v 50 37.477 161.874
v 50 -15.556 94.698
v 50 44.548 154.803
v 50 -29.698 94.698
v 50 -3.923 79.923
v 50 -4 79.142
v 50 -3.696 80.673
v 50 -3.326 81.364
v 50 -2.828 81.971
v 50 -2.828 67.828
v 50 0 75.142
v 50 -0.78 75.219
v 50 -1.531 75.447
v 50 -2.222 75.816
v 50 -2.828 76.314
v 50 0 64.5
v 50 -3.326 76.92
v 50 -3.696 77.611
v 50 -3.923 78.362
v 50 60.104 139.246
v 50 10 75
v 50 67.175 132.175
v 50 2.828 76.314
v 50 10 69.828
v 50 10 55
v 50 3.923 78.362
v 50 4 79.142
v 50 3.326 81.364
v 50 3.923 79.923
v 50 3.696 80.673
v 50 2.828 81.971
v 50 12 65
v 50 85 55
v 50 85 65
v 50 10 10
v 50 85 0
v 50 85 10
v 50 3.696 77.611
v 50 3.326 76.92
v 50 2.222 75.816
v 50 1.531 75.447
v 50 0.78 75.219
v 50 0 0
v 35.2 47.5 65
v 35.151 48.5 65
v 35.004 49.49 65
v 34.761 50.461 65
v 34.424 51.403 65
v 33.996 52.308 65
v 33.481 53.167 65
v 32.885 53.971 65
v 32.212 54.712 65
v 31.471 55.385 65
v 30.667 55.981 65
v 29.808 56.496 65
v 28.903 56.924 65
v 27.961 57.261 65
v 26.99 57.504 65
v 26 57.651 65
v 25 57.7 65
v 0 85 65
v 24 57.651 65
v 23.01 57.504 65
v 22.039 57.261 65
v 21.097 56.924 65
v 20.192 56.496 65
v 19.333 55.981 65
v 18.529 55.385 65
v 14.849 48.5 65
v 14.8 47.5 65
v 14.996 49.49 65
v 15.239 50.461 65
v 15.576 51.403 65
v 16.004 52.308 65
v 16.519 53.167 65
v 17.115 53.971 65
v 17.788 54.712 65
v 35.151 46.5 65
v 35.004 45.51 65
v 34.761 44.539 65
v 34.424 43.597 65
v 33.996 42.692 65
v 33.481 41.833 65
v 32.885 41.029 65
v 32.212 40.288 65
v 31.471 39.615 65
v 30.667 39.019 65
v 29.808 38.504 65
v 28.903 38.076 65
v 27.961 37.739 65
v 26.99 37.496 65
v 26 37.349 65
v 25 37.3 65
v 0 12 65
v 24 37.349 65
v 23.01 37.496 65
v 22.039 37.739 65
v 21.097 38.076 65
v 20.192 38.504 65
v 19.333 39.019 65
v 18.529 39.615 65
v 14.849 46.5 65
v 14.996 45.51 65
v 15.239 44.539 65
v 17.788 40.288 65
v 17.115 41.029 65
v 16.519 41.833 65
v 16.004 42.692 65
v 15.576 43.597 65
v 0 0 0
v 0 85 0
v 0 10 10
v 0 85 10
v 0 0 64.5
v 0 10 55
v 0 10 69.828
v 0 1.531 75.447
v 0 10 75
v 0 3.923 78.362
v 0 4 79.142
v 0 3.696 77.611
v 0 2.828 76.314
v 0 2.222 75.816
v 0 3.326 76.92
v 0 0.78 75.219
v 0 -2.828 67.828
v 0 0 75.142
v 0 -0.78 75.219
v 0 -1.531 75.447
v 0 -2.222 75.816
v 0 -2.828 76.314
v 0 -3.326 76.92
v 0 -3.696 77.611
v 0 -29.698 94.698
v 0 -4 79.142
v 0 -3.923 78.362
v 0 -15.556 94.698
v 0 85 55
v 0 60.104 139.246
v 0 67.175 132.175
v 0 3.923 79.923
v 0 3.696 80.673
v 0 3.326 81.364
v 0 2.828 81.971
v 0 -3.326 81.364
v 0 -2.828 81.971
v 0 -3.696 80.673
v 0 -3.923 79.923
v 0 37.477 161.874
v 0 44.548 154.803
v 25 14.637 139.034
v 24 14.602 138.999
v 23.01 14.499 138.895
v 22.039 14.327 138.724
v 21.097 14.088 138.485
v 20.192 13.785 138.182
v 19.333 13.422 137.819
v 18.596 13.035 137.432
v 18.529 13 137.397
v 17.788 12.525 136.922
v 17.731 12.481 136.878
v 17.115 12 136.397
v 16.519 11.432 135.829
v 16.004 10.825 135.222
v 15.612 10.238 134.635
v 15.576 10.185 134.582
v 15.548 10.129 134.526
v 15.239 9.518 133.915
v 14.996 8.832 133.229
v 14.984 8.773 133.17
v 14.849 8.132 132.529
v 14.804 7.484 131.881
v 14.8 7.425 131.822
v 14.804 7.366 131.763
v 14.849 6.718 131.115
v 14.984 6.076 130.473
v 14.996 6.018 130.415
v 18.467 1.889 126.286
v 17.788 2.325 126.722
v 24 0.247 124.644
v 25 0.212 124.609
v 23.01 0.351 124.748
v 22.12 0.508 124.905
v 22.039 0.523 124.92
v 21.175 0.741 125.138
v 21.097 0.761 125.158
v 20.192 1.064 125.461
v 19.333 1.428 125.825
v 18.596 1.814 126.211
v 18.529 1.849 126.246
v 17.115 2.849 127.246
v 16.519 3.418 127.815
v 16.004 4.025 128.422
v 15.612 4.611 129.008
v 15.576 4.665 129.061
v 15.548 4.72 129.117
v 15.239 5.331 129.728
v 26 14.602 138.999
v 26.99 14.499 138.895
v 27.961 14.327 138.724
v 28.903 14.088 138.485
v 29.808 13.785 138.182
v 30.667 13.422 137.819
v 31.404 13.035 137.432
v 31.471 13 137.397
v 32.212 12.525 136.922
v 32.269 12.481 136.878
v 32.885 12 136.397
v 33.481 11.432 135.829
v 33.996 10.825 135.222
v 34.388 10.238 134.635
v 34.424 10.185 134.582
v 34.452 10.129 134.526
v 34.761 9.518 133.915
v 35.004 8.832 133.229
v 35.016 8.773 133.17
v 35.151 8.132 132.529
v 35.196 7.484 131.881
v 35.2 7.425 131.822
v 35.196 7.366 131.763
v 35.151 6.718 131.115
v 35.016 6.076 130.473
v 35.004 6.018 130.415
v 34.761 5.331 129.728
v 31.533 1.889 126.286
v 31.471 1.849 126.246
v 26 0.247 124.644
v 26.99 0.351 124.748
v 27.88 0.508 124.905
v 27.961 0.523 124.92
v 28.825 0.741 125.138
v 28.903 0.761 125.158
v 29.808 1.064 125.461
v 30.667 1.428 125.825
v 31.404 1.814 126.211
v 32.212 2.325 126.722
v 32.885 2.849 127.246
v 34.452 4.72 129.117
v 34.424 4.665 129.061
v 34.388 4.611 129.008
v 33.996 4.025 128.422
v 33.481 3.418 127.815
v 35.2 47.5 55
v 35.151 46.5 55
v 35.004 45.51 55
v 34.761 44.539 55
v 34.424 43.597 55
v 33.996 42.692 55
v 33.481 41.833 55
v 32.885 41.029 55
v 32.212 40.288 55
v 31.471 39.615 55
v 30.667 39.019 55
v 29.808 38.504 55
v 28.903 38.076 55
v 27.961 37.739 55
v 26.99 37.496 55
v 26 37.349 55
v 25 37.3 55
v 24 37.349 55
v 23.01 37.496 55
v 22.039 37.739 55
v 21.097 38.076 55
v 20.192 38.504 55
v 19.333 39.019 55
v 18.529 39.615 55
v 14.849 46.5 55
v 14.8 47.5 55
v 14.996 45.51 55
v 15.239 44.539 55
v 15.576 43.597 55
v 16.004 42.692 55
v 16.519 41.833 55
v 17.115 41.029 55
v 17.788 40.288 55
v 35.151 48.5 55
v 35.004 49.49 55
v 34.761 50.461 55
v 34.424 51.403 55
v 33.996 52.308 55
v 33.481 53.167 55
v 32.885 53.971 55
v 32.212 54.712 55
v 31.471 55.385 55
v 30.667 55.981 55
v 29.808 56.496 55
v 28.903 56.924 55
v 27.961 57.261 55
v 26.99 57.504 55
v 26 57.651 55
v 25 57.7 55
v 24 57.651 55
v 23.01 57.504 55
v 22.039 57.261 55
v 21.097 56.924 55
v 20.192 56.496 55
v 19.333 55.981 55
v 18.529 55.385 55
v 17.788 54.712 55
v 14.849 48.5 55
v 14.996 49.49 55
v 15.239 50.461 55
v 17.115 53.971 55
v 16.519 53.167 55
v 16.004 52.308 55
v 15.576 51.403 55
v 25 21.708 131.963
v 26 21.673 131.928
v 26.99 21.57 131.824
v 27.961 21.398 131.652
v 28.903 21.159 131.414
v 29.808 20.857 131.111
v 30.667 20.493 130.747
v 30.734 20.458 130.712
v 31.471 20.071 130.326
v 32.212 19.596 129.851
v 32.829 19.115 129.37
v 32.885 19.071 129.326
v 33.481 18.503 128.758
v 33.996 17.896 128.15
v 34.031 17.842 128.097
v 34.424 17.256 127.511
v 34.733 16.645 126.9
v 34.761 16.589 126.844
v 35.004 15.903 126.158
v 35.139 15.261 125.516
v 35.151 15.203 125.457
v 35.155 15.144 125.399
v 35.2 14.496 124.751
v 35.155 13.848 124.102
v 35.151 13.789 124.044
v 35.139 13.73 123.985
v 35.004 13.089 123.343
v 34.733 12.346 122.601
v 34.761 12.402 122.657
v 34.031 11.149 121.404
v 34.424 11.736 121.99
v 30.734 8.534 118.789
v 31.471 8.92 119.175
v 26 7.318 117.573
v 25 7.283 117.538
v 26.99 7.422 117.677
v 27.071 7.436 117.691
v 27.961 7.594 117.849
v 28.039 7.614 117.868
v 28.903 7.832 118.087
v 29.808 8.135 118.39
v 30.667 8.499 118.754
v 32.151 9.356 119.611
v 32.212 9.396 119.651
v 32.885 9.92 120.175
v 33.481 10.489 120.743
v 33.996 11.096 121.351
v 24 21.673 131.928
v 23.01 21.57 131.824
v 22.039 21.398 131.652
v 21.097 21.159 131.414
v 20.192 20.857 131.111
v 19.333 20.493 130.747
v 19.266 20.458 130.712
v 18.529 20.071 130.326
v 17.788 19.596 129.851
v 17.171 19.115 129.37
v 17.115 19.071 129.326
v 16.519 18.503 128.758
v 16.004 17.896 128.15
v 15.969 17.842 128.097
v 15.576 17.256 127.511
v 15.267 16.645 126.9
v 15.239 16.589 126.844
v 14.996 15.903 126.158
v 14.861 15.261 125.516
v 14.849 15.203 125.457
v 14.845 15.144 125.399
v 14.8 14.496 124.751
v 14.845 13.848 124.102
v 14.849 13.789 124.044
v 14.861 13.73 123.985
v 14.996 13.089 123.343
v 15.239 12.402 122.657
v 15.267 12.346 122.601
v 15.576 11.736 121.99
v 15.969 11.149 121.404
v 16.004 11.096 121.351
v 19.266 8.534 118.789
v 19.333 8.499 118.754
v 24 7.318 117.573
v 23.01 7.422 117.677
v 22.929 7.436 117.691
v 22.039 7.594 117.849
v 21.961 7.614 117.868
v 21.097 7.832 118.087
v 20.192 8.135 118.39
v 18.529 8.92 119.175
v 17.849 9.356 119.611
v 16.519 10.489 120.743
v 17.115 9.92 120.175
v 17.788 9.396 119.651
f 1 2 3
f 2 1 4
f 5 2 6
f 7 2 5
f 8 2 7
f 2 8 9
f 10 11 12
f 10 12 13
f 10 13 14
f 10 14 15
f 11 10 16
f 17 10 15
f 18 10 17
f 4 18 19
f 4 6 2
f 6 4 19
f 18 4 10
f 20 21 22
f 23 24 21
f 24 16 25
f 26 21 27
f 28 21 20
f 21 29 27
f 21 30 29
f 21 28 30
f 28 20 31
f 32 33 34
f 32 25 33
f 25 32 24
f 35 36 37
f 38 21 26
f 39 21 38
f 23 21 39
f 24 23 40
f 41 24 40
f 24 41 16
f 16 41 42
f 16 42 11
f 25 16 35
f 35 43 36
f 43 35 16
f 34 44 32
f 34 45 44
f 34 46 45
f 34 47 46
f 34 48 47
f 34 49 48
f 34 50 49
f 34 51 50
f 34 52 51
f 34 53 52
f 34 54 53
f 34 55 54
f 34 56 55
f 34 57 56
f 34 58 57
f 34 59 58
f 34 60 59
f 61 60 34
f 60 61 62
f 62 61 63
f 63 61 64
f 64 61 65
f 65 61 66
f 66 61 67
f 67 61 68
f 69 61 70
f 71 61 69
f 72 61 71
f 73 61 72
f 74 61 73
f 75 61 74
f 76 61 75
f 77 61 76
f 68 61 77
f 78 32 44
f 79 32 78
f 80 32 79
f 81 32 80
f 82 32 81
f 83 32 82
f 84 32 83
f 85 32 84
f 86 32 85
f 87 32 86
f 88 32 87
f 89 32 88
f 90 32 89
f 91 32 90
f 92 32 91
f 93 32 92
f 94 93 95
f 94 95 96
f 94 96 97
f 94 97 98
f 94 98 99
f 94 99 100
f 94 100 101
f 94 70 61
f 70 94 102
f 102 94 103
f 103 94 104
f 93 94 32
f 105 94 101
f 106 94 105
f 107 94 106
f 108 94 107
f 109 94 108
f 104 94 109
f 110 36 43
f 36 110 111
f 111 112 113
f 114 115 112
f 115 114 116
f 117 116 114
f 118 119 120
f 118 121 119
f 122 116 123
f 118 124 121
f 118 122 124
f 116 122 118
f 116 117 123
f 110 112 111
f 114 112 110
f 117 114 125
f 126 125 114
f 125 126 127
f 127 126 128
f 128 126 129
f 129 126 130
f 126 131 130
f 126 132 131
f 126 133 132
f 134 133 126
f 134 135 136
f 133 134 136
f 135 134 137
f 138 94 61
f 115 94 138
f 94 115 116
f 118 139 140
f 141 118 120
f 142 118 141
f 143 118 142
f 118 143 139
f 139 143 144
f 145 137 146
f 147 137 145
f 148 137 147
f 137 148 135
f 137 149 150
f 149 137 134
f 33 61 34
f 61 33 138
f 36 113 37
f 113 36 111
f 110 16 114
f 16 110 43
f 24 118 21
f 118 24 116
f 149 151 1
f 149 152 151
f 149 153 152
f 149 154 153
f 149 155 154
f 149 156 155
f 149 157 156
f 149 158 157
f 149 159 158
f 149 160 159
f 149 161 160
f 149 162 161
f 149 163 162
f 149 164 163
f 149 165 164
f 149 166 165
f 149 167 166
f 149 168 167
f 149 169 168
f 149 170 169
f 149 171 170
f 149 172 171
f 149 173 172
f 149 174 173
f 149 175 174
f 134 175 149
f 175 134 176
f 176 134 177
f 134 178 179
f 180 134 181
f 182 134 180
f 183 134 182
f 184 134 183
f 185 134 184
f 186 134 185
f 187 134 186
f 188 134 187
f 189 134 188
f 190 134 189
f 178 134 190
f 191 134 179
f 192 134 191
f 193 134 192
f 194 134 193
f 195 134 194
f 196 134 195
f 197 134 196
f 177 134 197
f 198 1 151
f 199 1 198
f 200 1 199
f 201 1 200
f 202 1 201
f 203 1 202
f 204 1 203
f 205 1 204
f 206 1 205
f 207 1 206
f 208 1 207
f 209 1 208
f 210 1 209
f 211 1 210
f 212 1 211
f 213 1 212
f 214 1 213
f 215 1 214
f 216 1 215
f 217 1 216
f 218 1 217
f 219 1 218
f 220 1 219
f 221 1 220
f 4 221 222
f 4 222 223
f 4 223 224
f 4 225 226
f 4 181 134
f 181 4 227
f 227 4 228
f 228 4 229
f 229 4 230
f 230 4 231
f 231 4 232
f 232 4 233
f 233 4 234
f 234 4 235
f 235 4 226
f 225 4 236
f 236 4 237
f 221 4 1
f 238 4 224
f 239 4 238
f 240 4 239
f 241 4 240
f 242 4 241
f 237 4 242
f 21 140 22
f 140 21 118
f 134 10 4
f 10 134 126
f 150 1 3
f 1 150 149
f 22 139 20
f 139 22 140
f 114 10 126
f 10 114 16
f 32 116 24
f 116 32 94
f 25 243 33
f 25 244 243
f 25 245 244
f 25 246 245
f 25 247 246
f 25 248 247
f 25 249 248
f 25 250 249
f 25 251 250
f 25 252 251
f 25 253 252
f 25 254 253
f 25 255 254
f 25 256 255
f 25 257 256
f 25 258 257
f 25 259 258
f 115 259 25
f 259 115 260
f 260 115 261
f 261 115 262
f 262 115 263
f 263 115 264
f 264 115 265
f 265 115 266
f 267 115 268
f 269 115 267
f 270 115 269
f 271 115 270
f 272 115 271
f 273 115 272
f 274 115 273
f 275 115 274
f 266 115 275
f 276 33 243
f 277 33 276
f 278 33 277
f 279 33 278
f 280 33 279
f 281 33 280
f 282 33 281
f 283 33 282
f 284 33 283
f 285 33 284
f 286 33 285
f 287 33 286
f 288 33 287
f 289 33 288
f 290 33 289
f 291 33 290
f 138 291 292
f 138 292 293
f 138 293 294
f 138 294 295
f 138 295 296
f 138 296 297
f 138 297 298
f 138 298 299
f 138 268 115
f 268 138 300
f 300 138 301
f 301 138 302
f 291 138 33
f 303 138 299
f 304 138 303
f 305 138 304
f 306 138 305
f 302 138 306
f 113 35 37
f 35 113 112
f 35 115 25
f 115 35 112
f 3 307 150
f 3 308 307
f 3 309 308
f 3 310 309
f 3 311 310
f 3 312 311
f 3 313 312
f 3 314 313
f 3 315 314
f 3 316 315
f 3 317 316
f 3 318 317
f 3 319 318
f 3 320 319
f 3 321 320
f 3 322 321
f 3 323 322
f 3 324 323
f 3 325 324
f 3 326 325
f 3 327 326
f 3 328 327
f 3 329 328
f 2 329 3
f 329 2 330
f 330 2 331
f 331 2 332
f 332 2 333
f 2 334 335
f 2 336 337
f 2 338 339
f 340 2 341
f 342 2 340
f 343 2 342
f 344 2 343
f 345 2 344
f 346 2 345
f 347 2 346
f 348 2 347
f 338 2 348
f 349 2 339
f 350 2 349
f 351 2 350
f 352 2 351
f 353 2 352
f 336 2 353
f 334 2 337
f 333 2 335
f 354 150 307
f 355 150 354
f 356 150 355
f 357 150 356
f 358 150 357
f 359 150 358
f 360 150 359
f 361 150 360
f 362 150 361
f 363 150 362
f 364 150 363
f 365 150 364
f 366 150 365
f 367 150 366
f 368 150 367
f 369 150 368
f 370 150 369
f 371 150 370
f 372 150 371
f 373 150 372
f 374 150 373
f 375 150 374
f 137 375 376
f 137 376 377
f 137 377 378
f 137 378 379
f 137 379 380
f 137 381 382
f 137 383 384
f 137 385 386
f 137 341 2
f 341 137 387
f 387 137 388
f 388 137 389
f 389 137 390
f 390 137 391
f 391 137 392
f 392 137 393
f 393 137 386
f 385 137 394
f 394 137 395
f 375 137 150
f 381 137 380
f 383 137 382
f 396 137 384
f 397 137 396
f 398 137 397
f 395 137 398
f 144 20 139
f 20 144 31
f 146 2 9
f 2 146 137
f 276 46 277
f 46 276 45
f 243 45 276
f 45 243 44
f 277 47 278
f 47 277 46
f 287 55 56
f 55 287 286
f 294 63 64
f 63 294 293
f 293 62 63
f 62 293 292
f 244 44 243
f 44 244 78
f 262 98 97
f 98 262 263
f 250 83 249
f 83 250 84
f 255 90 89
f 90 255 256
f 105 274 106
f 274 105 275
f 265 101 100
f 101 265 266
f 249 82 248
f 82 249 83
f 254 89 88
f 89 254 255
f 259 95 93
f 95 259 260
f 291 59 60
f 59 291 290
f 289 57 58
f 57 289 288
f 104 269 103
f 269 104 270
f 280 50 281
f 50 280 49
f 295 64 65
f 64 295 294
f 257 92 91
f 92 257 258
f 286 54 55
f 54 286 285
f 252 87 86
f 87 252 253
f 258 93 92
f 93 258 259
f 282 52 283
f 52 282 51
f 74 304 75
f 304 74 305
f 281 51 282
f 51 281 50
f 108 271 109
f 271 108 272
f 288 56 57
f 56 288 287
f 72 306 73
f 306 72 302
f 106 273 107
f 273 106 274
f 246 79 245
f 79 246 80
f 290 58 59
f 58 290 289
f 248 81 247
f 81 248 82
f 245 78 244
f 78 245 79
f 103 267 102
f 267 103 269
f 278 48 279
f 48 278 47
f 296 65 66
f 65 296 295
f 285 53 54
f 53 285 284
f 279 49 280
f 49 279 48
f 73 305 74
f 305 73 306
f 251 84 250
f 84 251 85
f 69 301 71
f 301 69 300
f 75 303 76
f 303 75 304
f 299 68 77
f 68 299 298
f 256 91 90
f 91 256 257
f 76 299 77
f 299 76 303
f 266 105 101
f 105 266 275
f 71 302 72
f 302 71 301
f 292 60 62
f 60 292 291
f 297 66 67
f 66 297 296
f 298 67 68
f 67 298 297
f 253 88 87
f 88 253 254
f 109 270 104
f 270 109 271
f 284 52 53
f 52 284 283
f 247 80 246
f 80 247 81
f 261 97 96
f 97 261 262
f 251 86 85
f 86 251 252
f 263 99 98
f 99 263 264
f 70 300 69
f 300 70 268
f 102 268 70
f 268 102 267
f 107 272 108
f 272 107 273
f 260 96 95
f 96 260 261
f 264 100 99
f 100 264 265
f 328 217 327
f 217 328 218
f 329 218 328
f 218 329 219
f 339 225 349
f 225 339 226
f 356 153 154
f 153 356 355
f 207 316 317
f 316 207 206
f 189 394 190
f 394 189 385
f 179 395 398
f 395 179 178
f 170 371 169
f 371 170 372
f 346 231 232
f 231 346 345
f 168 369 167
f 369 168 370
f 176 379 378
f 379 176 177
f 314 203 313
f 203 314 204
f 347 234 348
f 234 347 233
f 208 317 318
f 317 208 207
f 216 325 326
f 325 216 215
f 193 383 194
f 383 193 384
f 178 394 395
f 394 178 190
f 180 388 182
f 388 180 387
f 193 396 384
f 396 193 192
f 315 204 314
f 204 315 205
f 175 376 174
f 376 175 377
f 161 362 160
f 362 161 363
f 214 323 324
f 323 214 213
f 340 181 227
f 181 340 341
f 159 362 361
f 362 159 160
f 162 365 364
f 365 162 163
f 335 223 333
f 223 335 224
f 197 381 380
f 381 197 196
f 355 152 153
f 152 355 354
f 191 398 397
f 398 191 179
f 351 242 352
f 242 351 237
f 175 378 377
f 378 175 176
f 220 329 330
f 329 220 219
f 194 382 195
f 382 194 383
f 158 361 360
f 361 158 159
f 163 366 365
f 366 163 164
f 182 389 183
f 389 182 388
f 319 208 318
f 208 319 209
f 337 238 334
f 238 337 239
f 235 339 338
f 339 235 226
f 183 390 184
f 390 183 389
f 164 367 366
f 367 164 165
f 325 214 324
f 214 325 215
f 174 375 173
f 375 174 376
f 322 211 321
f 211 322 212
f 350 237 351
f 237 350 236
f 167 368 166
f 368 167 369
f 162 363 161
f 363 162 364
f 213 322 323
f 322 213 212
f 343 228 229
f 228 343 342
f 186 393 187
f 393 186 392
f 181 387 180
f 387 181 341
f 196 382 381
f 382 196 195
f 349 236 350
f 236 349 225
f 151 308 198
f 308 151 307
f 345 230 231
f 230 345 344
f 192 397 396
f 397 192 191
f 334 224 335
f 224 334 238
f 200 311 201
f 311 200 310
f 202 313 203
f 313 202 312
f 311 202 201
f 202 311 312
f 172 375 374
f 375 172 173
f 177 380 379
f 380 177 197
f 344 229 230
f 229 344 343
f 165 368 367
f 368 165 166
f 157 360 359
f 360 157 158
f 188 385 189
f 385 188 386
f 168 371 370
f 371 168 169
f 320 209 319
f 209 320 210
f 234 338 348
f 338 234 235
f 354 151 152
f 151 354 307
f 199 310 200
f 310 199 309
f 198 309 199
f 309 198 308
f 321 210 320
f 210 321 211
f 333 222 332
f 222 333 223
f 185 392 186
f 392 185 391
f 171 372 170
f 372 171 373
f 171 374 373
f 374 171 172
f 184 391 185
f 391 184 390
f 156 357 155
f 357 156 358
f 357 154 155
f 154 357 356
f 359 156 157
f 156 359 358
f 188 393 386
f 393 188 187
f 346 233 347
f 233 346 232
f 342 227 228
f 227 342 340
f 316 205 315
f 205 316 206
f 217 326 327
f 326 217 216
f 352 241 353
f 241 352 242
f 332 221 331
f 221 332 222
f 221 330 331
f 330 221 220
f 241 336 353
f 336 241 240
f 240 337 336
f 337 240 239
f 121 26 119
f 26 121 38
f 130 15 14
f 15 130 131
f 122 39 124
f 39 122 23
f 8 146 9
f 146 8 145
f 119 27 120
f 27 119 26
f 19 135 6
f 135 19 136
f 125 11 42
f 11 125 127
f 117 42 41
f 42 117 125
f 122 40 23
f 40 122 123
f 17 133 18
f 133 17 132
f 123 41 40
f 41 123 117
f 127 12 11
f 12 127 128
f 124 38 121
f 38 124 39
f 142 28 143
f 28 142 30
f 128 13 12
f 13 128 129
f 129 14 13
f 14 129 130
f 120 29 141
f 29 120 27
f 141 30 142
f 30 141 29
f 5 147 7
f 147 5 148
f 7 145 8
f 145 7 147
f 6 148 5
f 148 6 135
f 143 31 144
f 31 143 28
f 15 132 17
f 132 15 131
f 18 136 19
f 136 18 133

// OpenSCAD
// ============================================================
// main_body.scad — Dual C-clamp tile chamfering jig
// ============================================================
// Print orientation: lay flat on the large XZ face (body_depth
// dimension becomes the print height, ~50 mm — no supports needed).
//
// Coordinate system used in this file:
//   X  — body depth (extrusion / print-height direction)
//   Y  — horizontal, pointing away from the bench edge (arm reach)
//   Z  — vertical (up)
// ============================================================

/* [Body] */
// Overall body depth (becomes print height when laid flat)
body_depth = 50;

/* [Wall Thickness] */
// Minimum wall / arm thickness for FDM structural strength
wall = 10;

/* [Lower Table C-Clamp] */
// Total arm reach (Y direction)
lc_arm_len = 85;
// Bench-slot opening height — bench thickness + clearance (~35 mm bench → 45 mm slot)
lc_opening = 45;

/* [Upper Tile C-Clamp] */
// Tile-bed arm length (projected along arm direction)
uc_arm_len = 95;
// Tile-slot opening (tile thickness + generous clearance)
uc_opening = 22;

/* [Relief Groove] */
// Radius of the dust / clearance groove at the tile-bed inner corner
groove_r = 4;

/* [Thread] */
// M20 nominal bore diameter (+ FDM clearance already added in threads.scad)
m20_bore = 20.4;   // 20 mm + 0.4 mm FDM clearance

/* [Resolution] */
$fn = 64;

// ---- Derived dimensions ----------------------------------------
lc_total_h = 2 * wall + lc_opening;  // 65 mm — lower C total height

// After rotate([45,0,0]) the upper-C box projects:
//   Y_max =  (uc_arm_len + uc_opening) / sqrt(2) ≈ 82 mm
//   Z_max =  (uc_arm_len + uc_opening) / sqrt(2) ≈ 82 mm
uc_total_h = 2 * wall + uc_opening;  // 42 mm — upper C box height (local)
SQRT2 = sqrt(2);

// Spine height — must cover the entire rotated upper-C back wall
spine_extra = (uc_total_h / SQRT2) + wall * 2;
spine_h = lc_total_h + spine_extra;  // ≈ 99 mm

// ================================================================
// TOP-LEVEL
// ================================================================
main_body();

module main_body() {
    difference() {
        body_solid();
        body_cutouts();
    }
}

// ================================================================
// SOLID UNION
// ================================================================
module body_solid() {
    union() {
        // 1. Lower C-clamp solid (box spanning full C geometry)
        lower_c_solid();

        // 2. Back-wall spine — structural backbone bridging both clamps
        spine_solid();

        // 3. Upper tile C-clamp solid (45° rotated C-box)
        upper_c_solid();

        // 4. Fillet/transition block between lower top and upper C base
        fillet_block();
    }
}

// ================================================================
// CUTOUTS (openings + thread holes + relief groove)
// ================================================================
module body_cutouts() {
    // Lower C bench slot
    lower_opening_cut();

    // Upper C tile slot
    upper_opening_cut();

    // Thread hole in the lower top arm (vertical, Z direction)
    lower_thread_hole();

    // Thread hole in the upper outer arm (45° in YZ, perpendicular to arm face)
    upper_thread_hole();

    // Relief groove at the inner corner of the tile bed
    relief_groove();
}

// ----------------------------------------------------------------
// Lower C-clamp solid
//   Box: X=0..BD, Y=0..lc_arm_len, Z=0..lc_total_h
// ----------------------------------------------------------------
module lower_c_solid() {
    cube([body_depth, lc_arm_len, lc_total_h]);
}

// ----------------------------------------------------------------
// Spine (back-wall backbone)
//   Runs from Z=0 up to spine_h covering the junction area.
//   Y range: 0..wall (the "back" wall strip)
// ----------------------------------------------------------------
module spine_solid() {
    cube([body_depth, wall, spine_h]);
}

// ----------------------------------------------------------------
// Upper C-clamp solid
//   A C-box (same profile as lower C) rotated 45° around X-axis,
//   pivoting at the top of the lower section (Z = lc_total_h).
//   The local Z direction after rotate([45,0,0]) becomes world
//   direction (-1/√2, 1/√2) in YZ, and local Y becomes (1/√2, 1/√2).
//   Net effect: the bed arm rises at 45° to horizontal. ✓
// ----------------------------------------------------------------
module upper_c_solid() {
    translate([0, 0, lc_total_h])
    rotate([45, 0, 0])
    cube([body_depth, uc_arm_len, uc_total_h]);
}

// ----------------------------------------------------------------
// Fillet / transition block
//   Fills the triangular gap that appears between the top surface
//   of the lower C and the underside of the rotated upper C.
//   Uses hull() between a thin slab at Z=lc_total_h and the
//   first slice of the upper C solid.
// ----------------------------------------------------------------
module fillet_block() {
    hull() {
        // Slab at top of lower C
        translate([0, 0, lc_total_h - 0.5])
        cube([body_depth, wall + 2, 0.5]);

        // Bottom strip of the rotated upper C (first 4 mm)
        translate([0, 0, lc_total_h])
        rotate([45, 0, 0])
        cube([body_depth, wall + 2, 4]);
    }
}

// ================================================================
// OPENING CUTOUTS
// ================================================================

// Lower C bench slot
//   Removes material from Y=wall to Y=lc_arm_len+1 (open end),
//   height=lc_opening, starting just above the bottom arm.
module lower_opening_cut() {
    translate([0, wall, wall])
    cube([body_depth, lc_arm_len - wall + 2, lc_opening]);
}

// Upper C tile slot
//   Same logic but in the rotated local space of the upper C.
module upper_opening_cut() {
    translate([0, 0, lc_total_h])
    rotate([45, 0, 0])
    translate([0, wall, wall])
    cube([body_depth, uc_arm_len - wall + 2, uc_opening]);
}

// ================================================================
// THREAD HOLES
// ================================================================

// Lower thread hole — vertical (Z axis), through the top arm.
//   Centre in Y at midpoint of top arm, centred in X.
module lower_thread_hole() {
    x_c = body_depth / 2;
    y_c = (wall + lc_arm_len) / 2;   // midpoint of arm in Y
    translate([x_c, y_c, lc_total_h - wall - 1])
    cylinder(d = m20_bore, h = wall + 2);
}

// Upper thread hole — perpendicular to the clamping arm face.
//   In local space the hole goes through the top arm in Z direction.
//   After rotate([45,0,0]) this becomes a 45° hole in world YZ.
module upper_thread_hole() {
    x_c = body_depth / 2;
    y_c = (wall + uc_arm_len) / 2;   // midpoint of arm in Y (local)
    z_top = uc_total_h;               // top of upper C box (local)

    translate([0, 0, lc_total_h])
    rotate([45, 0, 0])
    translate([x_c, y_c, z_top - wall - 1])
    cylinder(d = m20_bore, h = wall + 2);
}

// ================================================================
// RELIEF GROOVE
//   A cylindrical groove along the full X depth at the inner corner
//   of the tile bed (where the tile edge would otherwise be crushed).
//   Located at the back-inner corner of the tile slot in local space.
// ================================================================
module relief_groove() {
    // In local (rotated) space: the inner corner is at (Y=wall, Z=wall)
    translate([0, 0, lc_total_h])
    rotate([45, 0, 0])
    translate([-1, wall, wall])
    rotate([0, 90, 0])
    cylinder(r = groove_r, h = body_depth + 2, $fn = 32);
}
